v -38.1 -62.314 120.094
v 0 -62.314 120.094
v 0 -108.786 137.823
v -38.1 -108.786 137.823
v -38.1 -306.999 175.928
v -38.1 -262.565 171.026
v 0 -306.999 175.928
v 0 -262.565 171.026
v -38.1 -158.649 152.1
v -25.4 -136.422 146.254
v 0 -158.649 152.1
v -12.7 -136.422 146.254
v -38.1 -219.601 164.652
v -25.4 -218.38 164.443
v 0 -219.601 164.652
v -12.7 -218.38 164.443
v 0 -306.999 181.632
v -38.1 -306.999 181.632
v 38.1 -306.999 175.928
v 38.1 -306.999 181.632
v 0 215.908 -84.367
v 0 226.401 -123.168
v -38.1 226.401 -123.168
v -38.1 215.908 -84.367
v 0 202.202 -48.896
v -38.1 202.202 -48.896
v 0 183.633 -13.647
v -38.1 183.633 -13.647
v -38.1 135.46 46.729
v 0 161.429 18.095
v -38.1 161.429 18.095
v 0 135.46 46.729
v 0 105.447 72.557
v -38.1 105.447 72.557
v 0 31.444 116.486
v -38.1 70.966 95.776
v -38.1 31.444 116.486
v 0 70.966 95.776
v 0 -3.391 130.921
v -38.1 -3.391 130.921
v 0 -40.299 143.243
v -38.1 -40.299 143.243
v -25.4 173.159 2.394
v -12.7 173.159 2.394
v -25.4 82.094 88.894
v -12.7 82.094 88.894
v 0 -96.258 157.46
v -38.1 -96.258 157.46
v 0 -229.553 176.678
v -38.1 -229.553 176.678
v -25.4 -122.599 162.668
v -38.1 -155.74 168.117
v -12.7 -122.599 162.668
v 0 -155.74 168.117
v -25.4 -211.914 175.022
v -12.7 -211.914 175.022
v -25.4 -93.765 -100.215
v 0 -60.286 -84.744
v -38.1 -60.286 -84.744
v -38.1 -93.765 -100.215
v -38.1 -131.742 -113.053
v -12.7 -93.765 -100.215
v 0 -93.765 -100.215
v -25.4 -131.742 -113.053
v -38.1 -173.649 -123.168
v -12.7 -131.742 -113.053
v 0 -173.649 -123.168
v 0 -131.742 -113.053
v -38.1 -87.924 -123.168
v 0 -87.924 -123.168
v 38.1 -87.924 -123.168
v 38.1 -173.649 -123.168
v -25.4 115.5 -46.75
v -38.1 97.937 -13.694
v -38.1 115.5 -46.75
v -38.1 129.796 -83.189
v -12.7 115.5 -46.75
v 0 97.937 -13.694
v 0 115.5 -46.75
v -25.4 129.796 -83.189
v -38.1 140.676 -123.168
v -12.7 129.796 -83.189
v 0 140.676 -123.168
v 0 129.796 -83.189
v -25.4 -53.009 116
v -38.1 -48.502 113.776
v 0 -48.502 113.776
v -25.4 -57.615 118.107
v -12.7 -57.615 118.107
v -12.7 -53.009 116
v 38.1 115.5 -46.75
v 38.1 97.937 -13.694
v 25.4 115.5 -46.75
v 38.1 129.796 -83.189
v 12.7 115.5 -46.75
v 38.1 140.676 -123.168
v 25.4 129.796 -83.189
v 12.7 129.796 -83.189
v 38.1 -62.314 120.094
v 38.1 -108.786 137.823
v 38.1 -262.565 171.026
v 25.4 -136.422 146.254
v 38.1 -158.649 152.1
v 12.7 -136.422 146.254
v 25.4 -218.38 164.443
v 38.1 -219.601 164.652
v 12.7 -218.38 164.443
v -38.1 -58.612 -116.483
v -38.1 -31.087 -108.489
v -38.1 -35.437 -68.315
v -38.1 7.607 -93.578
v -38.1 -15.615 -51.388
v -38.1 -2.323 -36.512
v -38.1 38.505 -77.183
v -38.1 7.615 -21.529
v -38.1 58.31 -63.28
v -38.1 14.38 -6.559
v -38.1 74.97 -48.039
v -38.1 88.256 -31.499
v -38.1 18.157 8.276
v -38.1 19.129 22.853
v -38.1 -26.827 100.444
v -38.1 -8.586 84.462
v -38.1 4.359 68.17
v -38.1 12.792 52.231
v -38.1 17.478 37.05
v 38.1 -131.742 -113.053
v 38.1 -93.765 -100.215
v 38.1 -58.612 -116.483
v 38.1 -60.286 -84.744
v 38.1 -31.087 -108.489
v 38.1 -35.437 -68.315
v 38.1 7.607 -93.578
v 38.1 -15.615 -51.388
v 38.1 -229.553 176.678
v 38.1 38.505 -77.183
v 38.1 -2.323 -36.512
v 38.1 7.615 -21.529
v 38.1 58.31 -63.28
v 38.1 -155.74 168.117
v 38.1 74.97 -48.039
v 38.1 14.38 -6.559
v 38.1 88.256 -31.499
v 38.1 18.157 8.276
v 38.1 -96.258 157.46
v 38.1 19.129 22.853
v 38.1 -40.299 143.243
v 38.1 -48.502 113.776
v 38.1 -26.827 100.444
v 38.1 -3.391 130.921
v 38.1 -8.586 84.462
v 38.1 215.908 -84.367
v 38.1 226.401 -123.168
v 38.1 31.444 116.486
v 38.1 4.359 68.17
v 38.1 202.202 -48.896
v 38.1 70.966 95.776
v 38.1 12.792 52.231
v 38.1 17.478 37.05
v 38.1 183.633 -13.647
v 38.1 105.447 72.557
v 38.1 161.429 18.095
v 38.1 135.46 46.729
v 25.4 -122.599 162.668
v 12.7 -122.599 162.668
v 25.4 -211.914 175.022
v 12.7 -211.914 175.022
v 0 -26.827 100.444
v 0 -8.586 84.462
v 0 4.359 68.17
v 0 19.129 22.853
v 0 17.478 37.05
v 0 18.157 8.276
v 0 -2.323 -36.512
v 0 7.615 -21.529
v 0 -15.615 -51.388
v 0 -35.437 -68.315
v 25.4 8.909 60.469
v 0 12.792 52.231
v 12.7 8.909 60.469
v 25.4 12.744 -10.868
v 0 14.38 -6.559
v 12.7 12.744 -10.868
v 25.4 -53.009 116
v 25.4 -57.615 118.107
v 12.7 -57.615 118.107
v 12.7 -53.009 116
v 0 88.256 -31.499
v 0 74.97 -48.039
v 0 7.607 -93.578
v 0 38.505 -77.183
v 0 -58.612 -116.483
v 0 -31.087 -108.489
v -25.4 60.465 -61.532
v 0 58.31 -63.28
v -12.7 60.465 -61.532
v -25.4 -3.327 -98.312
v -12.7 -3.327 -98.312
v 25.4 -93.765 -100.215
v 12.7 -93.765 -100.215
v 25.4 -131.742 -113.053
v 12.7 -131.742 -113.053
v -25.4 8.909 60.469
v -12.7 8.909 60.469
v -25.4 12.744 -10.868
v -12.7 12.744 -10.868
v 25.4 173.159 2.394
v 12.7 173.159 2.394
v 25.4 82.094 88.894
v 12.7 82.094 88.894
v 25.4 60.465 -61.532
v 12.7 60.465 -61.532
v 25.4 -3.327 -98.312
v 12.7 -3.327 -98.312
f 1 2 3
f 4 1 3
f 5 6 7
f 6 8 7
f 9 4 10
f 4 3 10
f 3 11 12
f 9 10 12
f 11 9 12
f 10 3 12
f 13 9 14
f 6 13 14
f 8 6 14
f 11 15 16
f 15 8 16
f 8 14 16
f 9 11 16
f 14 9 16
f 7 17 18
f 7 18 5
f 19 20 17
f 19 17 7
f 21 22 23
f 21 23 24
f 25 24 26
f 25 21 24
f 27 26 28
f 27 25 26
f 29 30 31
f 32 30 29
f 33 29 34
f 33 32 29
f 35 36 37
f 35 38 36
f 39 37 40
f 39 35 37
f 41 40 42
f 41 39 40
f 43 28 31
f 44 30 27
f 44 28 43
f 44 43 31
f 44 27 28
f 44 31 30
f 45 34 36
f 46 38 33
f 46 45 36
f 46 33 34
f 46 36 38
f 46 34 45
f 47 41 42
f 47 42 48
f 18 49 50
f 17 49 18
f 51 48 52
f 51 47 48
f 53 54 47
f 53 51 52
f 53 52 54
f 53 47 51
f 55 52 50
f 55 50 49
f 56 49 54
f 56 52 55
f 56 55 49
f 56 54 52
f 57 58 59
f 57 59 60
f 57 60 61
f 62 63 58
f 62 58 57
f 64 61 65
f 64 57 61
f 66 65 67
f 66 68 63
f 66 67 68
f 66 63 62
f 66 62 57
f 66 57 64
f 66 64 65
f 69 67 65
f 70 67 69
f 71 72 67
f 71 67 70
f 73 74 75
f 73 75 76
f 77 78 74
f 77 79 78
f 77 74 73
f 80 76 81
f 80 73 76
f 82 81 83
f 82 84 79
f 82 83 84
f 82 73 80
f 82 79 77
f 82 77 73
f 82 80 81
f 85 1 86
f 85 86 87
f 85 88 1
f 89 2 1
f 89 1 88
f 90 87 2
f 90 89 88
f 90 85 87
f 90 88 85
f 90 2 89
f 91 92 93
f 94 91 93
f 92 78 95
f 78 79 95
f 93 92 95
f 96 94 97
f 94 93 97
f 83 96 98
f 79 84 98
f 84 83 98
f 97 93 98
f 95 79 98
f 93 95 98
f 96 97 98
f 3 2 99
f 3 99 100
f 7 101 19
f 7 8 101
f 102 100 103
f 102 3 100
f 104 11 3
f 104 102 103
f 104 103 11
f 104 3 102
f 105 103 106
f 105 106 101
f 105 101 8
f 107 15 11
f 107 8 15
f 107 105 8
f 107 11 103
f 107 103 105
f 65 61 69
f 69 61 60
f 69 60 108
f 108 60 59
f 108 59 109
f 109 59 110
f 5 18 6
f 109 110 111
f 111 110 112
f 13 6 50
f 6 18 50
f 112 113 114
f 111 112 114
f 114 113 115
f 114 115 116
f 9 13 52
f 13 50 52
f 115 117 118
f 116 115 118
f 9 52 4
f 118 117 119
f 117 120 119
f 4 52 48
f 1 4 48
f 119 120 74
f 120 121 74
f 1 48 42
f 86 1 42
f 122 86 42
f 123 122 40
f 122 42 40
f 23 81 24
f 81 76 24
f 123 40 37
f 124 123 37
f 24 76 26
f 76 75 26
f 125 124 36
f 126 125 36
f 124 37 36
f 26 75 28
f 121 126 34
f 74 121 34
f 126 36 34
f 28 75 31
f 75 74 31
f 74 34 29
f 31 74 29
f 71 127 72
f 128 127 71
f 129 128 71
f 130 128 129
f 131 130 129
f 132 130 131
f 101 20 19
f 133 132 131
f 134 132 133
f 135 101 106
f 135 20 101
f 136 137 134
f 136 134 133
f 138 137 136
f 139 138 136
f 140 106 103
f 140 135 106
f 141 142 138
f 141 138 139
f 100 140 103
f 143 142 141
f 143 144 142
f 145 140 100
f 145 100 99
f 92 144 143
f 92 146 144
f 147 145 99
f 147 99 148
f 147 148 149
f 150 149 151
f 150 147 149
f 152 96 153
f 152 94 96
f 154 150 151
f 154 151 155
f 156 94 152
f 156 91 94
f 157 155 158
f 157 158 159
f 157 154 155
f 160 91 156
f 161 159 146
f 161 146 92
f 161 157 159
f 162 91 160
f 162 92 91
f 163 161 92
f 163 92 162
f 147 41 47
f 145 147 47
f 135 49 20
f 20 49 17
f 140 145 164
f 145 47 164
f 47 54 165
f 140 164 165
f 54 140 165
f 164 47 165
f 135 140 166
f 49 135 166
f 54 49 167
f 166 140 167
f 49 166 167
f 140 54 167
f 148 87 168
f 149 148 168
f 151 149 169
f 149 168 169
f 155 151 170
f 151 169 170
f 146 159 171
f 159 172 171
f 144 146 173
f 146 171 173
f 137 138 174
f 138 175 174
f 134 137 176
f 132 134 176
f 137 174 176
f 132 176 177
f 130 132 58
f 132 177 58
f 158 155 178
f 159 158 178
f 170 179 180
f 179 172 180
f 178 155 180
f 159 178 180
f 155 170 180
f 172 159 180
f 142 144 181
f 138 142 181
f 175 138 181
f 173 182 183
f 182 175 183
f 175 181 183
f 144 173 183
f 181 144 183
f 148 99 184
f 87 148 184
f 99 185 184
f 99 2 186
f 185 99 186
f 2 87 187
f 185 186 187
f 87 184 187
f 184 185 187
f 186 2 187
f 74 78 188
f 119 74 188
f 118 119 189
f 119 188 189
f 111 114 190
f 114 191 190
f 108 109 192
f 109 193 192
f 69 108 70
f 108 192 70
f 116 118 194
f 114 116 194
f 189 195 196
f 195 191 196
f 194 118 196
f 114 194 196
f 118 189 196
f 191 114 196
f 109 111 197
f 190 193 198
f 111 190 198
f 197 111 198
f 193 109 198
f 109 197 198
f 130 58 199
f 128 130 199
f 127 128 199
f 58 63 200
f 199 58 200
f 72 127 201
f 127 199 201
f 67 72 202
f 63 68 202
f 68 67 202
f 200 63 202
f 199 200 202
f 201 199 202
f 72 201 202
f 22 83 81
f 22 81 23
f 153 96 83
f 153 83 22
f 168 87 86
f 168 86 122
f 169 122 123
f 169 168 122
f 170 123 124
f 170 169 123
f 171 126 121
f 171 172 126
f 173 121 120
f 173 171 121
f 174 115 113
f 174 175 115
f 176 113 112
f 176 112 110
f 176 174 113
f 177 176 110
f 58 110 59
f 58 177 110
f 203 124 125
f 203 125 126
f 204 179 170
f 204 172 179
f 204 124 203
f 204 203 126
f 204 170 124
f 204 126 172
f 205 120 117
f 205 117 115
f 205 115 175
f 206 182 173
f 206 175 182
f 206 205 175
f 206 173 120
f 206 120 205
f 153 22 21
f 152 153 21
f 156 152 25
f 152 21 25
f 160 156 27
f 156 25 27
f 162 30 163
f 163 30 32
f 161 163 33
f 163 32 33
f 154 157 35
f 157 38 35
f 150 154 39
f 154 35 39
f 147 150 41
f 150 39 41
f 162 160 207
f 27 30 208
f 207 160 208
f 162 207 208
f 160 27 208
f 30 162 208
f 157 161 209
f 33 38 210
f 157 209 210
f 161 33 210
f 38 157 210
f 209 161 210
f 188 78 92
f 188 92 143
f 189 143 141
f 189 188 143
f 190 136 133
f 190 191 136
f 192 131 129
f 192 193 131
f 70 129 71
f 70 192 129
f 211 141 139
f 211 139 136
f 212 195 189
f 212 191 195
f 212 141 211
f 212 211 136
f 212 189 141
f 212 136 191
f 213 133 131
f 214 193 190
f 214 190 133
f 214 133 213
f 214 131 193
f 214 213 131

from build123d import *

# Parameters (mm, degrees)
F1_DEPTH      = 38.1
F1_DEPTH_BACK = 38.1


with BuildPart() as f1:
    # F0 (on Right) → F1 (new body, two sides)
    with BuildSketch(Plane.YZ) as f1_sk:
        with BuildLine():
            add(Edge.make_bspline(
                [(89.0512747676, 84.3127688874), (51.5025046877, 109.6568065781), (7.9497262135, 128.8361399685), (-40.2992134272, 143.2426060549)],
                knots=[251.2899531871, 251.2899531871, 251.2899531871, 251.2899531871, 389.6266891942, 389.6266891942, 389.6266891942, 389.6266891942], degree=3))
            add(Edge.make_bspline(
                [(-40.2992134273, 143.2426060546), (-20.8577433202, 122.6663541214), (-6.4848342863, 102.9965586878), (3.3262747677, 84.3127688872)],
                knots=[0, 0, 0, 0, 44.9944338672, 44.9944338672, 44.9944338672, 44.9944338672], degree=3))
            add(Edge.make_bspline(
                [(97.9367360944, -13.693555973), (73.5382257251, 26.3390121062), (41.5418172622, 58.5186843595), (3.3262747677, 84.3127688872)],
                knots=[110.4967021115, 110.4967021115, 110.4967021115, 110.4967021115, 251.2899531868, 251.2899531868, 251.2899531868, 251.2899531868], degree=3))
            add(Edge.make_bspline(
                [(89.0512747676, 84.3127688874), (108.3054185182, 47.6461318492), (109.9905052366, 14.7769408359), (97.9367360944, -13.693555973)],
                knots=[44.994433867, 44.994433867, 44.994433867, 44.994433867, 133.2952867965, 133.2952867965, 133.2952867965, 133.2952867965], degree=3))
        make_face()
        with BuildLine():
            add(Edge.make_bspline(
                [(226.4007865727, -123.1679881383), (205.6551866214, -28.1042958821), (157.2589609394, 38.2750913429), (89.0512747676, 84.3127688874)],
                knots=[0, 0, 0, 0, 251.2899531871, 251.2899531871, 251.2899531871, 251.2899531871], degree=3))
            add(Edge.make_bspline(
                [(89.0512747676, 84.3127688874), (108.3054185182, 47.6461318492), (109.9905052366, 14.7769408359), (97.9367360944, -13.693555973)],
                knots=[44.994433867, 44.994433867, 44.994433867, 44.994433867, 133.2952867965, 133.2952867965, 133.2952867965, 133.2952867965], degree=3))
            add(Edge.make_bspline(
                [(140.6757865727, -123.1679881383), (131.5535739698, -81.366776623), (117.0850611145, -45.111729188), (97.9367360944, -13.693555973)],
                knots=[0, 0, 0, 0, 110.4967021115, 110.4967021115, 110.4967021115, 110.4967021115], degree=3))
            Line((140.6757865727, -123.1679881383), (226.4007865727, -123.1679881383))
        make_face()
        with BuildLine():
            add(Edge.make_bspline(
                [(-40.2992134273, 143.2426060546), (-20.8577433202, 122.6663541214), (-6.4848342863, 102.9965586878), (3.3262747677, 84.3127688872)],
                knots=[0, 0, 0, 0, 44.9944338672, 44.9944338672, 44.9944338672, 44.9944338672], degree=3))
            add(Edge.make_bspline(
                [(-40.2992134272, 143.2426060549), (-118.6758921642, 166.644798364), (-209.444563868, 177.4525894237), (-306.9992134273, 181.6320118621)],
                knots=[389.6266891942, 389.6266891942, 389.6266891942, 389.6266891942, 614.3440404205, 614.3440404205, 614.3440404205, 614.3440404205], degree=3))
            Line((-306.9992134273, 181.6320118621), (-306.9992134273, 175.9282581051))
            add(Edge.make_bspline(
                [(-62.3141094232, 120.0935377835), (-132.1010704471, 150.6607475907), (-215.4464728571, 167.3740709192), (-306.9992134273, 175.9282581051)],
                knots=[325.7434997871, 325.7434997871, 325.7434997871, 325.7434997871, 547.0018290671, 547.0018290671, 547.0018290671, 547.0018290671], degree=3))
            add(Edge.make_bspline(
                [(-62.3141094232, 120.0935377835), (-57.569536239, 118.1678217564), (-52.9586357331, 116.0573946954), (-48.5021746362, 113.7760695913)],
                knots=[0, 0, 0, 0, 11.285021106, 11.285021106, 11.285021106, 11.285021106], degree=3))
            add(Edge.make_bspline(
                [(3.3262747677, 84.3127688872), (-12.8680482417, 95.2433408301), (-30.1791713746, 105.0272217507), (-48.5021746362, 113.7760695913)],
                knots=[251.2899531868, 251.2899531868, 251.2899531868, 251.2899531868, 310.952887078, 310.952887078, 310.952887078, 310.952887078], degree=3))
        make_face()
        with BuildLine():
            add(Edge.make_bspline(
                [(3.3262747677, 84.3127688872), (41.6453572527, 11.3398074654), (10.3770996492, -46.5922688635), (-60.2863327619, -84.7440264271)],
                knots=[44.9944338672, 44.9944338672, 44.9944338672, 44.9944338672, 220.7284322597, 220.7284322597, 220.7284322597, 220.7284322597], degree=3))
            add(Edge.make_bspline(
                [(3.3262747677, 84.3127688872), (-12.8680482417, 95.2433408301), (-30.1791713746, 105.0272217507), (-48.5021746362, 113.7760695913)],
                knots=[251.2899531868, 251.2899531868, 251.2899531868, 251.2899531868, 310.952887078, 310.952887078, 310.952887078, 310.952887078], degree=3))
            add(Edge.make_bspline(
                [(-48.5021746362, 113.7760695913), (27.9357955296, 74.6463977604), (58.938174531, -14.7609439509), (-60.2863327619, -84.7440264271)],
                knots=[11.285021106, 11.285021106, 11.285021106, 11.285021106, 204.8476008888, 204.8476008888, 204.8476008888, 204.8476008888], degree=3))
        make_face()
        with BuildLine():
            add(Edge.make_bspline(
                [(97.9367360944, -13.693555973), (73.5382257251, 26.3390121062), (41.5418172622, 58.5186843595), (3.3262747677, 84.3127688872)],
                knots=[110.4967021115, 110.4967021115, 110.4967021115, 110.4967021115, 251.2899531868, 251.2899531868, 251.2899531868, 251.2899531868], degree=3))
            add(Edge.make_bspline(
                [(3.3262747677, 84.3127688872), (41.6453572527, 11.3398074654), (10.3770996492, -46.5922688635), (-60.2863327619, -84.7440264271)],
                knots=[44.9944338672, 44.9944338672, 44.9944338672, 44.9944338672, 220.7284322597, 220.7284322597, 220.7284322597, 220.7284322597], degree=3))
            add(Edge.make_bspline(
                [(-60.2863327619, -84.7440264271), (-91.3257478525, -101.5024571889), (-129.9663361934, -114.4443385734), (-173.6492134273, -123.1679881383)],
                knots=[220.7284322597, 220.7284322597, 220.7284322597, 220.7284322597, 297.9208404899, 297.9208404899, 297.9208404899, 297.9208404899], degree=3))
            Line((-173.6492134273, -123.1679881383), (-87.9242134273, -123.1679881383))
            add(Edge.make_bspline(
                [(97.9367360944, -13.693555973), (75.4640378893, -66.7731259386), (5.2367335677, -104.5633653163), (-87.9242134273, -123.1679881383)],
                knots=[133.2952867965, 133.2952867965, 133.2952867965, 133.2952867965, 297.9208404899, 297.9208404899, 297.9208404899, 297.9208404899], degree=3))
        make_face()
    extrude(amount=F1_DEPTH)
    extrude(f1_sk.sketch, amount=-F1_DEPTH_BACK)


solid = f1.part
